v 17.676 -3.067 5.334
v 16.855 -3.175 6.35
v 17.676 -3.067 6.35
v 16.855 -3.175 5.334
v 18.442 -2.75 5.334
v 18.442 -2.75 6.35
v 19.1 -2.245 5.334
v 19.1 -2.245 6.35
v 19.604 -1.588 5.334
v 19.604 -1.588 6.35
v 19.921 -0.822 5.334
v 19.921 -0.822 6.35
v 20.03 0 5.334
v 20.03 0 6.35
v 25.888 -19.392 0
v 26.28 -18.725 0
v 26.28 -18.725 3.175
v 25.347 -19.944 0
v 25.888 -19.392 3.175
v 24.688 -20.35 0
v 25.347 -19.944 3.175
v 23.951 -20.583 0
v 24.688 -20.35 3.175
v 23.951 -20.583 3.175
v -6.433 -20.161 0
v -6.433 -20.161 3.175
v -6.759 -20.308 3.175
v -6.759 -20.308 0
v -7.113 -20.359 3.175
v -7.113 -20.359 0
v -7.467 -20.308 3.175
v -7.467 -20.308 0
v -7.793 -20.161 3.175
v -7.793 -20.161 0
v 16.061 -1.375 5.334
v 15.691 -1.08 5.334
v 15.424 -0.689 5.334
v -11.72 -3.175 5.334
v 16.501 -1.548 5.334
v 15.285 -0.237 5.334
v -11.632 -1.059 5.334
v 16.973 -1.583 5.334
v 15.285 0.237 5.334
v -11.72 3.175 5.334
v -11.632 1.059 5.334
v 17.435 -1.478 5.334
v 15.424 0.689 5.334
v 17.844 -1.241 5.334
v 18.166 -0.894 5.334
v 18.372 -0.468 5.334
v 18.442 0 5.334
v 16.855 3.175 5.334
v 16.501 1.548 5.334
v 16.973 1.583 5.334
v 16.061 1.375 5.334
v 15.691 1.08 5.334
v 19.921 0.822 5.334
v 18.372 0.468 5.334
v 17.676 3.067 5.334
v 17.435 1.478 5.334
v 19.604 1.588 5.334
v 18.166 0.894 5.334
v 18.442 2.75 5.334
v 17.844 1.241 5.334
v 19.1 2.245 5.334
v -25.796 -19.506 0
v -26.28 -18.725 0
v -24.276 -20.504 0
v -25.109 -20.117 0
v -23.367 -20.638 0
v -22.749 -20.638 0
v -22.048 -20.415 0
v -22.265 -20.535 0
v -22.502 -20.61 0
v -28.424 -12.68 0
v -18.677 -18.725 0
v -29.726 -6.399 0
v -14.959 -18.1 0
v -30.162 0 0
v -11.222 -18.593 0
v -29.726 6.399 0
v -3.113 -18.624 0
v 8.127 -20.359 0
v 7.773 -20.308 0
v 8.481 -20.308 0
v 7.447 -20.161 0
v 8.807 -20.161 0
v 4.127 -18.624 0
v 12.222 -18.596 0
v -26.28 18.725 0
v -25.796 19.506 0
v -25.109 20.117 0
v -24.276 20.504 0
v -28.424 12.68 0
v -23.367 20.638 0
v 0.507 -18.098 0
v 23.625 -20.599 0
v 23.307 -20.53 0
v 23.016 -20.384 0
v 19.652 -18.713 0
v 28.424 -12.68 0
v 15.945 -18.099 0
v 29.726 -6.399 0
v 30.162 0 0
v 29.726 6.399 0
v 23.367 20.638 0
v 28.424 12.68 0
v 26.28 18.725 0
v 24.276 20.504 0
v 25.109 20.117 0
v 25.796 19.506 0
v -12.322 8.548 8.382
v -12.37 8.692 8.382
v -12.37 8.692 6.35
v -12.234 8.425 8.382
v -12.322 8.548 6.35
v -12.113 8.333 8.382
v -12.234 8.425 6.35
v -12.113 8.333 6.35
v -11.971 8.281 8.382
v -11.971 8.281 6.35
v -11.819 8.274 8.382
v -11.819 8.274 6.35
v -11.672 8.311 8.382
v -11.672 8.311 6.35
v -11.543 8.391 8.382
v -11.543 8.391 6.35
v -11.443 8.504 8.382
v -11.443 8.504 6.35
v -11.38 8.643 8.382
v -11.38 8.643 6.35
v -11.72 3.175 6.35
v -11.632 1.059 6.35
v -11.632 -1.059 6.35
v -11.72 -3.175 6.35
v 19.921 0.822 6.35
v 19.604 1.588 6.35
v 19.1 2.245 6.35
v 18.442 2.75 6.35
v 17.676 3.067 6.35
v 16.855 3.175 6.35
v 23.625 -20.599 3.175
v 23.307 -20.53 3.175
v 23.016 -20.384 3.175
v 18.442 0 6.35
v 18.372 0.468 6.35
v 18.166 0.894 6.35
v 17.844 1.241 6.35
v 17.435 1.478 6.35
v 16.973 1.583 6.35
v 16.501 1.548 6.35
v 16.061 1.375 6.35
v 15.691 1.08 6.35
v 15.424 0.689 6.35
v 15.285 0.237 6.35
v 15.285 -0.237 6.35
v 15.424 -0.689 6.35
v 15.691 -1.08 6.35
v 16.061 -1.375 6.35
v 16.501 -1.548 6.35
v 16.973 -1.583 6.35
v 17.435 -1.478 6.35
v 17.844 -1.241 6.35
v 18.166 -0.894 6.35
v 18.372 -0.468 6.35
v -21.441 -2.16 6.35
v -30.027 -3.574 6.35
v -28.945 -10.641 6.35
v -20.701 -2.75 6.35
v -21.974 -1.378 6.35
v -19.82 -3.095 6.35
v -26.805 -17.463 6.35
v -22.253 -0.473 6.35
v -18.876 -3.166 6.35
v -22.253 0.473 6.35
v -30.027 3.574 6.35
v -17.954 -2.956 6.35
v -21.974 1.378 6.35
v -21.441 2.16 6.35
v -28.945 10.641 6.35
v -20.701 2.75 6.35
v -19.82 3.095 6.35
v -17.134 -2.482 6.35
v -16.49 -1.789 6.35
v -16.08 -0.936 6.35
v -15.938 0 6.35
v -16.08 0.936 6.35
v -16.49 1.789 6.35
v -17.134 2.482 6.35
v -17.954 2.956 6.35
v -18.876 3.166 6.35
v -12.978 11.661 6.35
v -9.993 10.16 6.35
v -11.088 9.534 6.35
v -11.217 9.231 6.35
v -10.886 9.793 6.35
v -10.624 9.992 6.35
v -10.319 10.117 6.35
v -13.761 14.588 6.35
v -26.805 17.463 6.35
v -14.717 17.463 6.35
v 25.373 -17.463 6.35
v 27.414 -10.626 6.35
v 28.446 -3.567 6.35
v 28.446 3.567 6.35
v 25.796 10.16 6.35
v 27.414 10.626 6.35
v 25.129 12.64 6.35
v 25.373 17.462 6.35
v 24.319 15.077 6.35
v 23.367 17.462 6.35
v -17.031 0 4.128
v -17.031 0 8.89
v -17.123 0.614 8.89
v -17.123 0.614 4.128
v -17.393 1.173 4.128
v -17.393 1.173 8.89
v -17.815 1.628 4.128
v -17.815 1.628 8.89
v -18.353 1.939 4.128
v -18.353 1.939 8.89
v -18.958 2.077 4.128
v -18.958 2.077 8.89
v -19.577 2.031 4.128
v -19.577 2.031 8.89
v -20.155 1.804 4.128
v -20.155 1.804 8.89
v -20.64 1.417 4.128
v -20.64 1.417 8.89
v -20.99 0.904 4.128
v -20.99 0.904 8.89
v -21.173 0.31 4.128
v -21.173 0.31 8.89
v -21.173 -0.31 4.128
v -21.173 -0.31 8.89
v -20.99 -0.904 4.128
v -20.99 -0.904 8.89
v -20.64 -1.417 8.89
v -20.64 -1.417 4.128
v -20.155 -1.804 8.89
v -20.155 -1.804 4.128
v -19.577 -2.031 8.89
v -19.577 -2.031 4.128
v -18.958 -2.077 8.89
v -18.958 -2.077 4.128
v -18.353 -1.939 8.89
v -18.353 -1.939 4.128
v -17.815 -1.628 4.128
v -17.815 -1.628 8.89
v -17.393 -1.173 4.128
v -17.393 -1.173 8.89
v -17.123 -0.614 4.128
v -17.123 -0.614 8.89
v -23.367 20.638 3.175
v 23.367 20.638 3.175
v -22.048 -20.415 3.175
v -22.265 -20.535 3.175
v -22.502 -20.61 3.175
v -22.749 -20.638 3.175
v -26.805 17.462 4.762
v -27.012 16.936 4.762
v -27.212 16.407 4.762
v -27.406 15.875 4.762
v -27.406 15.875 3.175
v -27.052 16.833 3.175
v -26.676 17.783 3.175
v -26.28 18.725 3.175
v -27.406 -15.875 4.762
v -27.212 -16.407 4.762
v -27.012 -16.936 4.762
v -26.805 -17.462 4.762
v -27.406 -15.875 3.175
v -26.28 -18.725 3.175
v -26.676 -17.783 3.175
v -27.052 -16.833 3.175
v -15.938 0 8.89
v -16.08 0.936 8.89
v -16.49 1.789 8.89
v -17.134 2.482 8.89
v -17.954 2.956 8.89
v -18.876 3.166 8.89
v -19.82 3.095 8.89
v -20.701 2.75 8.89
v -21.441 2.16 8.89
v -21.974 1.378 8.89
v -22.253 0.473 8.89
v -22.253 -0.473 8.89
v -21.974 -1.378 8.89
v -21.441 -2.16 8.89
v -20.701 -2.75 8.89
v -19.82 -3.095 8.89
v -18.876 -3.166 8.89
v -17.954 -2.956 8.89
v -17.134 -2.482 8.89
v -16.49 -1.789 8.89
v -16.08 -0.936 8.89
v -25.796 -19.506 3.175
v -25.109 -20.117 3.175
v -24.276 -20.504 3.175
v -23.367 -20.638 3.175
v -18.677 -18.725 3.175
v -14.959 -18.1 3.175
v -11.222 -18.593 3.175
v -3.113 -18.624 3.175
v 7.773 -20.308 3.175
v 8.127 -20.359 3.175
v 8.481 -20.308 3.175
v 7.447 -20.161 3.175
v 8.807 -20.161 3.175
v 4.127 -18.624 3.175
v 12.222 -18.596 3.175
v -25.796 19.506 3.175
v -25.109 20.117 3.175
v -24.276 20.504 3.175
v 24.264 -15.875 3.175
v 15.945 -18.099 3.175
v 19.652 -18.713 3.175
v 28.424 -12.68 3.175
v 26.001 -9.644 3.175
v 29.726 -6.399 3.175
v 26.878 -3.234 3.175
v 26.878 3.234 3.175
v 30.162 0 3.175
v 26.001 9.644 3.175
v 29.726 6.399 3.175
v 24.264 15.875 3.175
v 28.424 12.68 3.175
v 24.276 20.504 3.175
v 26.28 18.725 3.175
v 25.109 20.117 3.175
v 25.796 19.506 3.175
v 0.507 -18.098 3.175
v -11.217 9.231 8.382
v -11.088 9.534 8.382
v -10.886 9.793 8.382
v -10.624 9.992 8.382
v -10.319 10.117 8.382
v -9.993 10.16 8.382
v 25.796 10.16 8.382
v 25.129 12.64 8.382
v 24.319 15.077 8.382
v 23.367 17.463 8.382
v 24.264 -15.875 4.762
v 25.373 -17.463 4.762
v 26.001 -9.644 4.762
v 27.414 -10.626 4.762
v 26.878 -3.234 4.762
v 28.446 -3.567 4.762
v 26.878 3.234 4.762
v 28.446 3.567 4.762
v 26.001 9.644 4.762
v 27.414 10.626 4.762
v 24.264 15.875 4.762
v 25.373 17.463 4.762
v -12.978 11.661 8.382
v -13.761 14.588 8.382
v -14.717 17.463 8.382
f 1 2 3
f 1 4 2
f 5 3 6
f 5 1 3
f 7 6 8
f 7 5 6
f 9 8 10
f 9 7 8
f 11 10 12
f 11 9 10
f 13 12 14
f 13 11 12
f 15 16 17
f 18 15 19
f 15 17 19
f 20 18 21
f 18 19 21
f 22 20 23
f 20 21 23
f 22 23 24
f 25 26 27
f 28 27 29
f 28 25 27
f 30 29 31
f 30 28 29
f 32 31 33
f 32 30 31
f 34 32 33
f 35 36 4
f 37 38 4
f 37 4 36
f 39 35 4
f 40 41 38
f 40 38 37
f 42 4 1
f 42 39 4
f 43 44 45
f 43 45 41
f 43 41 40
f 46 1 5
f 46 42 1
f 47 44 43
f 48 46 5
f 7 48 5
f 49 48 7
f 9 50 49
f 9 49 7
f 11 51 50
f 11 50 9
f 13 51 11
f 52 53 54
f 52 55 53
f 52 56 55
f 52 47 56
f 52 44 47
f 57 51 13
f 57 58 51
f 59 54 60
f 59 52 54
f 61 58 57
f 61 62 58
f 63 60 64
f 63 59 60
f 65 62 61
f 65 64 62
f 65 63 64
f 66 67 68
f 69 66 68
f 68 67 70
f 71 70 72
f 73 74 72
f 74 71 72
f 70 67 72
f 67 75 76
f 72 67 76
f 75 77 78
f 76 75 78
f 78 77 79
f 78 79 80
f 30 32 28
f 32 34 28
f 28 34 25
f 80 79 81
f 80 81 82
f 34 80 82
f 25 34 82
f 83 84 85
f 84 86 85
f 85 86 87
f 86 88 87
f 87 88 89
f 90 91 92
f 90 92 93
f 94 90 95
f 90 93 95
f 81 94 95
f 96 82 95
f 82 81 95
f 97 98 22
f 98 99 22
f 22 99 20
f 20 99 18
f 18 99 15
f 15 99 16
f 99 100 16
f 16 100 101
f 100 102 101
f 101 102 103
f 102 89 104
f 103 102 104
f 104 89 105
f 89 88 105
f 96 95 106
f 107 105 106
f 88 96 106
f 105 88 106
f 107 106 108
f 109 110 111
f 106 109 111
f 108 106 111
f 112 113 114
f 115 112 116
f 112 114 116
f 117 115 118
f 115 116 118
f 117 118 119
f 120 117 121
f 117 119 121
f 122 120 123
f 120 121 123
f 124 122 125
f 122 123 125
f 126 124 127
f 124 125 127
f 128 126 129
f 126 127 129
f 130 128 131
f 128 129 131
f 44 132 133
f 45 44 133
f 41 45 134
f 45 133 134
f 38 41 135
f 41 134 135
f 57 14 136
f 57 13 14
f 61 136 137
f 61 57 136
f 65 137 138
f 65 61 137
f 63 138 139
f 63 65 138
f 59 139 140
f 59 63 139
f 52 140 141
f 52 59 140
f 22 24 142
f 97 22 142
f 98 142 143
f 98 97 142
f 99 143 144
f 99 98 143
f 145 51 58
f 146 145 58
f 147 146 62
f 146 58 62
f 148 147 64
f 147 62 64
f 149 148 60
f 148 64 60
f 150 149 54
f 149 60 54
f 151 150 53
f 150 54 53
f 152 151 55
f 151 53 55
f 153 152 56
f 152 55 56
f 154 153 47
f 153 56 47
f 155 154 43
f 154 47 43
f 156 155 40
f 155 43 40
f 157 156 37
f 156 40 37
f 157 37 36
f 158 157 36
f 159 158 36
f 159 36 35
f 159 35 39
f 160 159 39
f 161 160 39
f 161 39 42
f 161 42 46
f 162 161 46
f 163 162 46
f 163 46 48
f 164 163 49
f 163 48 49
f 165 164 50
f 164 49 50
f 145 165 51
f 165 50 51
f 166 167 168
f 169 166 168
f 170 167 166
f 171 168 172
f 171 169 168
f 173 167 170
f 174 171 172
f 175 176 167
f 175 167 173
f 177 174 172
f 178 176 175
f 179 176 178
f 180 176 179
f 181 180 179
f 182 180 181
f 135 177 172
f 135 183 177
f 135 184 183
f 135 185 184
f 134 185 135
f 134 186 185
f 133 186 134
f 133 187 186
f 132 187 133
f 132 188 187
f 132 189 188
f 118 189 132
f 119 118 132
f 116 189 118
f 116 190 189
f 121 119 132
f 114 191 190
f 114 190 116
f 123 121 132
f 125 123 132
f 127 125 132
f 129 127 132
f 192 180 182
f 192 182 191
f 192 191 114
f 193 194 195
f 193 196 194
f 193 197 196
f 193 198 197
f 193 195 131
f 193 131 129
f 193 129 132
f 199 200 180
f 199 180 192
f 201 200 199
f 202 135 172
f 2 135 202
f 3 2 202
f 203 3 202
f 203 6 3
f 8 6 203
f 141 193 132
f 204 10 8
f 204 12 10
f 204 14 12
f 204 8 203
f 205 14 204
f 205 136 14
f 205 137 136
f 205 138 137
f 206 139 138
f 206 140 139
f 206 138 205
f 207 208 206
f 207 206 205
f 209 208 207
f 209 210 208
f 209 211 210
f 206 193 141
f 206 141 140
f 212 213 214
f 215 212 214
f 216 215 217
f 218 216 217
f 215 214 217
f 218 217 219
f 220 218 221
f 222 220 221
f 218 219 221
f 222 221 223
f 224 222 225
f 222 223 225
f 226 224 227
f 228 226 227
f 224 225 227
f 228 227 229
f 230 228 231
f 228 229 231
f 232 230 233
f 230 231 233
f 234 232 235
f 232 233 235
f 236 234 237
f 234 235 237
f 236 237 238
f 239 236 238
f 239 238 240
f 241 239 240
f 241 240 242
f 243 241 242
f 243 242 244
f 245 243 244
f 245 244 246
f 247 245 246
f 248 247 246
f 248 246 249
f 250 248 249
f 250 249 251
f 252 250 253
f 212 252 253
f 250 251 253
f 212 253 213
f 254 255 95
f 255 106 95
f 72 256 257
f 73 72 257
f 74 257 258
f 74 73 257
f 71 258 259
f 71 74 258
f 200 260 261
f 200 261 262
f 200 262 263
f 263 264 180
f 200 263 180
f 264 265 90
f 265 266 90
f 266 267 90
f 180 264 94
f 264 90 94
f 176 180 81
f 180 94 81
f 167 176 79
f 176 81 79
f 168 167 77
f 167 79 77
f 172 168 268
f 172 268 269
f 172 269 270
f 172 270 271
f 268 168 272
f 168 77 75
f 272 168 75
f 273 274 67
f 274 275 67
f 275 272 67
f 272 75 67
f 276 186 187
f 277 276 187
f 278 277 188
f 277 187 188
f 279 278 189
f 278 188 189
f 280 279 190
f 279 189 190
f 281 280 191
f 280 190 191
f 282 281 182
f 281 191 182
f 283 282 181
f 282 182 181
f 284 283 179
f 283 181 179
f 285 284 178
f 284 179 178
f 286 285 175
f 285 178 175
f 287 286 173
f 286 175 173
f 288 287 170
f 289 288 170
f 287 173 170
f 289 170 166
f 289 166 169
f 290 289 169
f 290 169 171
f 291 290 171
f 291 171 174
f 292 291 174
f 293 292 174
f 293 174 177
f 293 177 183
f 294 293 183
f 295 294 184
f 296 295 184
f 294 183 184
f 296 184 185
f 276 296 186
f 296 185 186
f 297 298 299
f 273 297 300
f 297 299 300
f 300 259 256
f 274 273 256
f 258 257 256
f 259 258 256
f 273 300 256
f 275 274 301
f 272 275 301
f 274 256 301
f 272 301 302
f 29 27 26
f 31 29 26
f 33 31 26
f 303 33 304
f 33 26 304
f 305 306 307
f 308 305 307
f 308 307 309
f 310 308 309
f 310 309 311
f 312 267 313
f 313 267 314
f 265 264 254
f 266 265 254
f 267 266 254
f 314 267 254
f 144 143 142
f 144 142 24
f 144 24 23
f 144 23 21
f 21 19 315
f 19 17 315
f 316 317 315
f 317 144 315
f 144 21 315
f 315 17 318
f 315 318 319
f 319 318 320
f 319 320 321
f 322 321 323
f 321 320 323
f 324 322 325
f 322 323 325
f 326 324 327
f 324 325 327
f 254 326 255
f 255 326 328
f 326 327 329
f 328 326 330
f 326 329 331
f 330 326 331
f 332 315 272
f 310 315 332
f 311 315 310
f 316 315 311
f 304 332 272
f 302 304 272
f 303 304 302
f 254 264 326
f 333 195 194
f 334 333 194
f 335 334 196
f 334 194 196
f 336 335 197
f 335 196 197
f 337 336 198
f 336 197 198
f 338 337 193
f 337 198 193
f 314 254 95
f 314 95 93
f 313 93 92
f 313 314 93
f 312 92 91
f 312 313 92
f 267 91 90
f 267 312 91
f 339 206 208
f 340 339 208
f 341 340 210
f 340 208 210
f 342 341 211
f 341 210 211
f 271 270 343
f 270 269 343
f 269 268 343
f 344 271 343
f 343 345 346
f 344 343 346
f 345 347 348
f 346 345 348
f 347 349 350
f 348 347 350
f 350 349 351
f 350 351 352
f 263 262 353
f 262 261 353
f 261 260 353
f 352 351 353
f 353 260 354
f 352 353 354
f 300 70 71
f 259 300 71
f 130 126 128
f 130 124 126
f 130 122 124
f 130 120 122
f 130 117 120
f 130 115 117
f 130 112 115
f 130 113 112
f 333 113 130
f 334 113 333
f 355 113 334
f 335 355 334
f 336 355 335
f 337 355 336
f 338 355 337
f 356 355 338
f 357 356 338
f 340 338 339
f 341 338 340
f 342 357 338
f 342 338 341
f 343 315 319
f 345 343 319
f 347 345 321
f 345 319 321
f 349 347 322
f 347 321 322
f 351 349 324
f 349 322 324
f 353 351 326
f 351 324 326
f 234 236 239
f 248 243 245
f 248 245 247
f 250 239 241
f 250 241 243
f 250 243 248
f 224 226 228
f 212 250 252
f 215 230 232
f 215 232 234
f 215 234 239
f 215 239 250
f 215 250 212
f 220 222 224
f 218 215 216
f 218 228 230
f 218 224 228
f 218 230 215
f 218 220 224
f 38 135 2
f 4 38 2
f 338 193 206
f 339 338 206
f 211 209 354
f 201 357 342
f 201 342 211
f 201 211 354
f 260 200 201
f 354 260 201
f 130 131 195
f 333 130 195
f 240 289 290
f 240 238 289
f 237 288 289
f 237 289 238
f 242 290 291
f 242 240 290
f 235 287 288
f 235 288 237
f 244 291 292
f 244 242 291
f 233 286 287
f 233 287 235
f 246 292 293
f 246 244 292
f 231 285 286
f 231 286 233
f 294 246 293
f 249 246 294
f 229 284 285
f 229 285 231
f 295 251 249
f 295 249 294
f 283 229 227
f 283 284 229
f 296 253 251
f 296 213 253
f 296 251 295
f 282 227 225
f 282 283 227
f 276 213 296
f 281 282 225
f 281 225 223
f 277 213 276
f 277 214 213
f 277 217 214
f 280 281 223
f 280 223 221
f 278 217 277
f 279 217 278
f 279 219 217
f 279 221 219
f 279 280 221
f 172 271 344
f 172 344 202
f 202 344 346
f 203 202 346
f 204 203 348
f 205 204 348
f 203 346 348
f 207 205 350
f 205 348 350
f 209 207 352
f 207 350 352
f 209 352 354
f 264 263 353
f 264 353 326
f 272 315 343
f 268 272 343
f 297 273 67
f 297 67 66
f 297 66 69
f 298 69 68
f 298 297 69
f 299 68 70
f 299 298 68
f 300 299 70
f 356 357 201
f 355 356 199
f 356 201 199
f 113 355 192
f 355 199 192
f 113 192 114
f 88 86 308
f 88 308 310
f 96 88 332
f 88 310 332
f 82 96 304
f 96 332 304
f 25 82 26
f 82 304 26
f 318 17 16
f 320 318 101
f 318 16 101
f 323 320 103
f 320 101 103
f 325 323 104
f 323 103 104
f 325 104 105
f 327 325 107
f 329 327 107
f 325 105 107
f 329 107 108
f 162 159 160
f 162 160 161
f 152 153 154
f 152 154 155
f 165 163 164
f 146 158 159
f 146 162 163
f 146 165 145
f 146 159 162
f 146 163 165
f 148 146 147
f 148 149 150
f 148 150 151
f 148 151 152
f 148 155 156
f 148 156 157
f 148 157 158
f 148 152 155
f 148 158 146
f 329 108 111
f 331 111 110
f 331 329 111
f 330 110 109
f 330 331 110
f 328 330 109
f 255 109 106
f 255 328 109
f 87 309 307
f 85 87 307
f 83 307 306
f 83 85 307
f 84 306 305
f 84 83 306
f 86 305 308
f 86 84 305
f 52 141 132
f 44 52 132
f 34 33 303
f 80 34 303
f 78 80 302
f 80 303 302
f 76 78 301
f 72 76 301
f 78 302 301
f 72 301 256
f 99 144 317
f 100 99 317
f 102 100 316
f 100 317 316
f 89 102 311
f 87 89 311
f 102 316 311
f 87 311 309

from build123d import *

# Parameters (mm, degrees)
F1_DEPTH     = 6.35
F2_R         = 3.175
F3_R         = 3.175
F4_DEPTH     = 2.54
F6_DEPTH     = 2.032
F7_T1_DEPTH  = 7.9826274972
F8_R         = 3.175
F9_R         = 2.0828
F10_DEPTH    = 4.7625
F12_DEPTH    = 1.016
F13_R        = 3.17499
F14_R        = 1.5875
F15_DEPTH    = 1.016
F19_DEPTH    = 6.351
F20_T1_DEPTH = 9.3839178422
F20_T3_DEPTH = 10.5760872304
F20_T5_DEPTH = 8.4107682306
F25_DEPTH    = 63.5


# Not quite as in the source:
# - a fillet or chamfer that OpenCascade refuses, or shapes differently, is made with other operations: its cross-section is extruded or revolved along the edge and cut away or added
# - a fillet or chamfer is up to 0.001 mm smaller than in the source, because OpenCascade refuses the exact size
# - a feature of the source that left no trace in its solid (it failed there, or was rolled back) is left out


with BuildPart() as f1:
    # F0 (on Top) → F1 (new body)
    with BuildSketch(Plane.XY):
        with BuildLine():
            ThreePointArc((25.4, -20.6375), (30.1625, 0), (25.4, 20.6375))
            Line((25.4, 20.6375), (-25.4, 20.6375))
            ThreePointArc((-25.4, 20.6375), (-30.1625, 0), (-25.4, -20.6375))
            Line((-25.4, -20.6375), (25.4, -20.6375))
        make_face()
    extrude(amount=F1_DEPTH)

    # F2
    f2_edges = [f1.edges().sort_by_distance(p)[0] for p in [
        (-25.4, 20.6375, 3.175),
        (-25.4, -20.6375, 3.175),
        (25.4, -20.6375, 3.175),
        (25.4, 20.6375, 3.175),
    ]]
    fillet(f2_edges, radius=F2_R)

    # F3 (on face) → F4 (join)
    with BuildSketch(Plane.XY.offset(6.35)):
        with Locations((-19.1135, 0)):
            Circle(F3_R)
    extrude(amount=F4_DEPTH)

    # F5 (on face) → F6 (join)
    with BuildSketch(Plane.XY.offset(6.35)):
        with BuildLine():
            ThreePointArc((25.7962114887, 10.16), (24.151933107, 15.5254784859), (21.8369283945, 20.6375))
            Line((21.8369283945, 20.6375), (-16.002, 20.6375))
            ThreePointArc((-16.002, 20.6375), (-13.4865218815, 13.6398781095), (-12.0195455914, 6.35))
            Line((-12.0195455914, 6.35), (-11.2165052403, 9.2309969527))
            ThreePointArc((-11.2165052403, 9.2309969527), (-10.7612010879, 9.9014262529), (-9.9931405857, 10.16))
            Line((-9.9931405857, 10.16), (25.7962114887, 10.16))
        make_face()
    extrude(amount=F6_DEPTH)

    # F7: fillet of radius 0.508 on 1 edges, made by hand

    # F7_s2 → F7_t1 (cut)
    with BuildSketch(Plane.XY.offset(6.35)):
        with BuildLine():
            ThreePointArc((-12.3702984959, 8.6923219718), (-11.8951499479, 8.2718785653), (-11.3804445383, 8.6428464104))
            Line((-11.3804445383, 8.6428464104), (-12.0195455914, 6.35))
            ThreePointArc((-12.0195455914, 6.35), (-12.1812694874, 7.523205399), (-12.3702984959, 8.6923219718))
        make_face()
    extrude(amount=F7_T1_DEPTH, mode=Mode.SUBTRACT)

    # F8
    f8_edges = [f1.edges().sort_by_distance(p)[0] for p in [
        (21.836928, 20.6375, 7.366),
    ]]
    fillet(f8_edges, radius=F8_R)

    # F9 (on face) → F10 (cut)
    with BuildSketch(Plane.XY.offset(8.89)):
        with Locations((-19.1135, 0)):
            Circle(F9_R)
    extrude(amount=-F10_DEPTH, mode=Mode.SUBTRACT)

    # F11 (on face) → F12 (cut)
    with BuildSketch(Plane.XY.offset(6.35)):
        with BuildLine():
            ThreePointArc((-11.7204239002, 3.175), (-11.6211080672, 0), (-11.7204239002, -3.175))
            Line((-11.7204239002, -3.175), (20.0295760998, -3.175))
            Line((20.0295760998, -3.175), (20.0295760998, 3.175))
            Line((20.0295760998, 3.175), (-11.7204239002, 3.175))
        make_face()
    extrude(amount=-F12_DEPTH, mode=Mode.SUBTRACT)

    # F13 (radius 3.175 in the source; OpenCascade refuses exactly that, so slightly less here)
    f13_edges = [f1.edges().sort_by_distance(p)[0] for p in [
        (20.029576, 3.175, 5.842),
        (20.029576, -3.175, 5.842),
    ]]
    fillet(f13_edges, radius=F13_R)

    # F14 (on face) → F15 (join, through all)
    with BuildSketch(Plane.XY.offset(5.334)):
        with Locations((16.8545760998, 0)):
            Circle(F14_R)
    extrude(amount=F15_DEPTH)

    # F18 (on face) → F19 (cut, through all)
    with BuildSketch(Plane.XY.offset(6.35)):
        with BuildLine():
            Line((8.1267993519, -20.6375), (23.3667993519, -20.6375))
            ThreePointArc((23.3667993519, -20.6375), (15.7467993519, -18.0975), (8.1267993519, -20.6375))
        make_face()
        with BuildLine():
            Line((-7.1132006481, -20.6375), (8.1267993519, -20.6375))
            ThreePointArc((8.1267993519, -20.6375), (0.5067993519, -18.0975), (-7.1132006481, -20.6375))
        make_face()
        with BuildLine():
            Line((-22.3532006481, -20.6375), (-7.1132006481, -20.6375))
            ThreePointArc((-7.1132006481, -20.6375), (-14.7332006481, -18.0975), (-22.3532006481, -20.6375))
        make_face()
    extrude(amount=-F19_DEPTH, mode=Mode.SUBTRACT)

    # F20: fillet of radius 1.27 on 4 edges, made by hand

    # F20_s2 → F20_t1 (cut)
    with BuildSketch(Plane.XY.offset(-1.5169589211)):
        with BuildLine():
            ThreePointArc((23.9708158767, -20.5796179073), (23.4664541239, -20.5753299276), (23.0035373612, -20.3750620187))
            Line((23.0035373612, -20.3750620187), (22.9890237709, -20.3959070588))
            ThreePointArc((22.9890237709, -20.3959070588), (23.1714765643, -20.5252240374), (23.3515593519, -20.65782))
            Line((23.3515593519, -20.65782), (23.3667993519, -20.6629))
            ThreePointArc((23.3667993519, -20.6629), (23.6726182662, -20.648255005), (23.9756478567, -20.6045540651))
            Line((23.9756478567, -20.6045540651), (23.9708158767, -20.5796179073))
        make_face()
    extrude(amount=F20_T1_DEPTH, mode=Mode.SUBTRACT)

    # F20_s4 → F20_t3 (cut)
    with BuildSketch(Plane.XY.offset(-2.1130436152)):
        with BuildLine():
            ThreePointArc((8.8195315833, -20.1532329387), (8.1267993519, -20.3587978512), (7.4340671204, -20.1532329387))
            Line((7.4340671204, -20.1532329387), (7.4202124758, -20.1745216404))
            ThreePointArc((7.4202124758, -20.1745216404), (7.7699369678, -20.410377341), (8.1115593519, -20.65782))
            Line((8.1115593519, -20.65782), (8.1420393519, -20.65782))
            ThreePointArc((8.1420393519, -20.65782), (8.4836617359, -20.410377341), (8.8333862279, -20.1745216404))
            Line((8.8333862279, -20.1745216404), (8.8195315833, -20.1532329387))
        make_face()
        with BuildLine():
            ThreePointArc((-6.4204684167, -20.1532329387), (-7.1132006481, -20.3587978512), (-7.8059328796, -20.1532329387))
            Line((-7.8059328796, -20.1532329387), (-7.8197875242, -20.1745216404))
            ThreePointArc((-7.8197875242, -20.1745216404), (-7.4700630322, -20.410377341), (-7.1284406481, -20.65782))
            Line((-7.1284406481, -20.65782), (-7.0979606481, -20.65782))
            ThreePointArc((-7.0979606481, -20.65782), (-6.7563382641, -20.410377341), (-6.4066137721, -20.1745216404))
            Line((-6.4066137721, -20.1745216404), (-6.4204684167, -20.1532329387))
        make_face()
    extrude(amount=F20_T3_DEPTH, mode=Mode.SUBTRACT)

    # F20_s6 → F20_t5 (cut)
    with BuildSketch(Plane.XY.offset(-1.0303841153)):
        with BuildLine():
            ThreePointArc((-22.0351532703, -20.4066892562), (-22.382433504, -20.5784970549), (-22.7653542821, -20.6376))
            Line((-22.7653542821, -20.6376), (-22.7653542821, -20.663))
            ThreePointArc((-22.7653542821, -20.663), (-22.5592774651, -20.6629), (-22.3532006481, -20.6629))
            Line((-22.3532006481, -20.6629), (-22.3379606481, -20.65782))
            ThreePointArc((-22.3379606481, -20.65782), (-22.1801756491, -20.5413775117), (-22.0205492501, -20.4274710413))
            Line((-22.0205492501, -20.4274710413), (-22.0351532703, -20.4066892562))
        make_face()
    extrude(amount=F20_T5_DEPTH, mode=Mode.SUBTRACT)

    # F21 (on Front) → F23 (revolve, cut)
    with BuildSketch(Plane.XZ):
        Polygon((26.9875, 4.7625), (26.9875, 3.175), (30.1625, 3.175), (30.1625, 6.35), (28.575, 6.35), (28.575, 4.7625), align=None)
    revolve(axis=Axis((-20.6375, 0, 8.7874885648), (0, 0, 1)), mode=Mode.SUBTRACT)

    # F24 (on Right) → F25 (cut, symmetric)
    with BuildSketch(Plane.YZ):
        Polygon((15.875, 3.175), (20.6375, 3.175), (20.6375, 8.382), (17.4625, 8.382), (17.4625, 4.7625), (15.875, 4.7625), align=None)
        Polygon((-15.875, 4.7625), (-17.4625, 4.7625), (-17.4625, 8.382), (-20.6375, 8.382), (-20.6375, 3.175), (-15.875, 3.175), align=None)
    extrude(amount=F25_DEPTH, both=True, mode=Mode.SUBTRACT)


solid = f1.part
